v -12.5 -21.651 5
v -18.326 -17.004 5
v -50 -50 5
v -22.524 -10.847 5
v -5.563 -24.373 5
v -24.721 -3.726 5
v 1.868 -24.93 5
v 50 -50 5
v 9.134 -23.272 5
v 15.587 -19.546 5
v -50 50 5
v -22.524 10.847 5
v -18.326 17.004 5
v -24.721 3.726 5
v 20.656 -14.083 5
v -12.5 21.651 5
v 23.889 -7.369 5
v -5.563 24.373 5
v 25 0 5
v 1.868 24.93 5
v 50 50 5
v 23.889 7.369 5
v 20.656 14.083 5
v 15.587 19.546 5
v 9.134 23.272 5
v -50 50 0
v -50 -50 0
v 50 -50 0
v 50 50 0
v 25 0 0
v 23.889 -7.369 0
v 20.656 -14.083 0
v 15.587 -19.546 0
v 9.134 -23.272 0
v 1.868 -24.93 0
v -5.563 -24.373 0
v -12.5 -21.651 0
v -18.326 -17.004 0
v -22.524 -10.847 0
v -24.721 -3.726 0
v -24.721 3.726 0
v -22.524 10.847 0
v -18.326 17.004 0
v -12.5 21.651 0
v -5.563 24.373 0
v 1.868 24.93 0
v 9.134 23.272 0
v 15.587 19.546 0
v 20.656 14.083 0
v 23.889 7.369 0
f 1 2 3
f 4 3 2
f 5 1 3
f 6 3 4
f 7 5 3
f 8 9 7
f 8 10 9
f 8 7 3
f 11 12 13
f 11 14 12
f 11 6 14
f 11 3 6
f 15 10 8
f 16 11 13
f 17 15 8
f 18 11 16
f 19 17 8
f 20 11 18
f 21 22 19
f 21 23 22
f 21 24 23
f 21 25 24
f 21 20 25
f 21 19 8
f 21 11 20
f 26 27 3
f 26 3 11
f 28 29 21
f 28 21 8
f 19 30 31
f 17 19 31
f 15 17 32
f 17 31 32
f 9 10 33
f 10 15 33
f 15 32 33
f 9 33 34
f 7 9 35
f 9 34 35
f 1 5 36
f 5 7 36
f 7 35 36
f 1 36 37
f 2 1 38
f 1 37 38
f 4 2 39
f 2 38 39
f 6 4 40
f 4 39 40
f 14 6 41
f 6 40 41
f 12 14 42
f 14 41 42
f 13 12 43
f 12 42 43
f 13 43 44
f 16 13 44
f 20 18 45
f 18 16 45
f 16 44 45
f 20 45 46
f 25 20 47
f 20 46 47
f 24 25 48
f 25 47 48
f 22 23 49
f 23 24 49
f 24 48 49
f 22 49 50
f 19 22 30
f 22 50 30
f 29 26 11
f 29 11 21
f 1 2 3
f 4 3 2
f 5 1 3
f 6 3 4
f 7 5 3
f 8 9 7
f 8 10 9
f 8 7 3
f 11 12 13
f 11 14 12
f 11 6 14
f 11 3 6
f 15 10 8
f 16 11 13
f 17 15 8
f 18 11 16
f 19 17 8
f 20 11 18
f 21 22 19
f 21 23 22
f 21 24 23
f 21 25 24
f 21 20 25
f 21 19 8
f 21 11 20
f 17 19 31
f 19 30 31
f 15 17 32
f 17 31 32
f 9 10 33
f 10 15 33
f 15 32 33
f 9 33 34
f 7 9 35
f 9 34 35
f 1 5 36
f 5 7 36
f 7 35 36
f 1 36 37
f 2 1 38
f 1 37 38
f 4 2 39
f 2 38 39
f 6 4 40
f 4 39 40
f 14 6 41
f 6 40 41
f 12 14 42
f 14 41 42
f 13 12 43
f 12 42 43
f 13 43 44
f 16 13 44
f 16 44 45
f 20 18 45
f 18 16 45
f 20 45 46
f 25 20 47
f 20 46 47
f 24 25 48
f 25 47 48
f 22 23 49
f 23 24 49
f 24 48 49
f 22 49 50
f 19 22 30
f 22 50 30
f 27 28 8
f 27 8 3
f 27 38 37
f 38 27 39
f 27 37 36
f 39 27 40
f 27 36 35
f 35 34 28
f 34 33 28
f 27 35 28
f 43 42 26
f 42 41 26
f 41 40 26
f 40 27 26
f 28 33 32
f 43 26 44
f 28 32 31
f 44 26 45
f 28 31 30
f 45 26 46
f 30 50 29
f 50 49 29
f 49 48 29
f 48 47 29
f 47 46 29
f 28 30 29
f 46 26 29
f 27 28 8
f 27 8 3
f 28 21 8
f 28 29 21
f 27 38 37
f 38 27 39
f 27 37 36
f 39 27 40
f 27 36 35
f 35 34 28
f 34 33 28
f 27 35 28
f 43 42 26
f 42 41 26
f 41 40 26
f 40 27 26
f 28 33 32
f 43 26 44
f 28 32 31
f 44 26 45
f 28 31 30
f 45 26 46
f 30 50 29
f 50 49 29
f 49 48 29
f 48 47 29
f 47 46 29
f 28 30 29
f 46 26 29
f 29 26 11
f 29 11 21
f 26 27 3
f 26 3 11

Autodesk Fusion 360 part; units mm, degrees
sketch "Sketch1" plane through (0, 0, 0) normal (0, 0, 1) x (1, 0, 0) in component "square washer"
  line L0 (-50, 50) -> (50, 50)
  line L1 (50, 50) -> (50, -50)
  line L2 (50, -50) -> (-50, -50)
  line L3 (-50, -50) -> (-50, 50)
  line L4 (-50, 50) -> (50, -50) construction
  line L5 (50, 50) -> (-50, -50) construction
  circle A0 centre (0, 0) radius 25
  dimension "d1" = 100
  dimension "d2" = 50
extrude "Extrude1" add sketch "Sketch1" along normal blind 5 makes body 1 in component "square washer"
sketch "Sketch1 (2)" plane through (0, 0, 0) normal (0, 0, 1) x (1, 0, 0) in component "square washer (1)"
  line L0 (-50, 50) -> (50, 50)
  line L1 (50, 50) -> (50, -50)
  line L2 (50, -50) -> (-50, -50)
  line L3 (-50, -50) -> (-50, 50)
  line L4 (-50, 50) -> (50, -50) construction
  line L5 (50, 50) -> (-50, -50) construction
  circle A0 centre (0, 0) radius 25
  dimension "d1_1" = 100
  dimension "d2_1" = 50
extrude "Extrude1'" add sketch "Sketch1 (2)" along normal blind 5 separate body makes body 2 in component "square washer (1)"
component "square washer" placed x (1, 0, 0) y (0, 1, 0) z (0, 0, 1) at (0, 0, 0)
component "square washer (1)" placed x (1, 0, 0) y (0, 1, 0) z (0, 0, 1) at (0, 0, 0)
equation "d2 = d1 / 2"
equation "d2_1 = d1_1 / 2"
